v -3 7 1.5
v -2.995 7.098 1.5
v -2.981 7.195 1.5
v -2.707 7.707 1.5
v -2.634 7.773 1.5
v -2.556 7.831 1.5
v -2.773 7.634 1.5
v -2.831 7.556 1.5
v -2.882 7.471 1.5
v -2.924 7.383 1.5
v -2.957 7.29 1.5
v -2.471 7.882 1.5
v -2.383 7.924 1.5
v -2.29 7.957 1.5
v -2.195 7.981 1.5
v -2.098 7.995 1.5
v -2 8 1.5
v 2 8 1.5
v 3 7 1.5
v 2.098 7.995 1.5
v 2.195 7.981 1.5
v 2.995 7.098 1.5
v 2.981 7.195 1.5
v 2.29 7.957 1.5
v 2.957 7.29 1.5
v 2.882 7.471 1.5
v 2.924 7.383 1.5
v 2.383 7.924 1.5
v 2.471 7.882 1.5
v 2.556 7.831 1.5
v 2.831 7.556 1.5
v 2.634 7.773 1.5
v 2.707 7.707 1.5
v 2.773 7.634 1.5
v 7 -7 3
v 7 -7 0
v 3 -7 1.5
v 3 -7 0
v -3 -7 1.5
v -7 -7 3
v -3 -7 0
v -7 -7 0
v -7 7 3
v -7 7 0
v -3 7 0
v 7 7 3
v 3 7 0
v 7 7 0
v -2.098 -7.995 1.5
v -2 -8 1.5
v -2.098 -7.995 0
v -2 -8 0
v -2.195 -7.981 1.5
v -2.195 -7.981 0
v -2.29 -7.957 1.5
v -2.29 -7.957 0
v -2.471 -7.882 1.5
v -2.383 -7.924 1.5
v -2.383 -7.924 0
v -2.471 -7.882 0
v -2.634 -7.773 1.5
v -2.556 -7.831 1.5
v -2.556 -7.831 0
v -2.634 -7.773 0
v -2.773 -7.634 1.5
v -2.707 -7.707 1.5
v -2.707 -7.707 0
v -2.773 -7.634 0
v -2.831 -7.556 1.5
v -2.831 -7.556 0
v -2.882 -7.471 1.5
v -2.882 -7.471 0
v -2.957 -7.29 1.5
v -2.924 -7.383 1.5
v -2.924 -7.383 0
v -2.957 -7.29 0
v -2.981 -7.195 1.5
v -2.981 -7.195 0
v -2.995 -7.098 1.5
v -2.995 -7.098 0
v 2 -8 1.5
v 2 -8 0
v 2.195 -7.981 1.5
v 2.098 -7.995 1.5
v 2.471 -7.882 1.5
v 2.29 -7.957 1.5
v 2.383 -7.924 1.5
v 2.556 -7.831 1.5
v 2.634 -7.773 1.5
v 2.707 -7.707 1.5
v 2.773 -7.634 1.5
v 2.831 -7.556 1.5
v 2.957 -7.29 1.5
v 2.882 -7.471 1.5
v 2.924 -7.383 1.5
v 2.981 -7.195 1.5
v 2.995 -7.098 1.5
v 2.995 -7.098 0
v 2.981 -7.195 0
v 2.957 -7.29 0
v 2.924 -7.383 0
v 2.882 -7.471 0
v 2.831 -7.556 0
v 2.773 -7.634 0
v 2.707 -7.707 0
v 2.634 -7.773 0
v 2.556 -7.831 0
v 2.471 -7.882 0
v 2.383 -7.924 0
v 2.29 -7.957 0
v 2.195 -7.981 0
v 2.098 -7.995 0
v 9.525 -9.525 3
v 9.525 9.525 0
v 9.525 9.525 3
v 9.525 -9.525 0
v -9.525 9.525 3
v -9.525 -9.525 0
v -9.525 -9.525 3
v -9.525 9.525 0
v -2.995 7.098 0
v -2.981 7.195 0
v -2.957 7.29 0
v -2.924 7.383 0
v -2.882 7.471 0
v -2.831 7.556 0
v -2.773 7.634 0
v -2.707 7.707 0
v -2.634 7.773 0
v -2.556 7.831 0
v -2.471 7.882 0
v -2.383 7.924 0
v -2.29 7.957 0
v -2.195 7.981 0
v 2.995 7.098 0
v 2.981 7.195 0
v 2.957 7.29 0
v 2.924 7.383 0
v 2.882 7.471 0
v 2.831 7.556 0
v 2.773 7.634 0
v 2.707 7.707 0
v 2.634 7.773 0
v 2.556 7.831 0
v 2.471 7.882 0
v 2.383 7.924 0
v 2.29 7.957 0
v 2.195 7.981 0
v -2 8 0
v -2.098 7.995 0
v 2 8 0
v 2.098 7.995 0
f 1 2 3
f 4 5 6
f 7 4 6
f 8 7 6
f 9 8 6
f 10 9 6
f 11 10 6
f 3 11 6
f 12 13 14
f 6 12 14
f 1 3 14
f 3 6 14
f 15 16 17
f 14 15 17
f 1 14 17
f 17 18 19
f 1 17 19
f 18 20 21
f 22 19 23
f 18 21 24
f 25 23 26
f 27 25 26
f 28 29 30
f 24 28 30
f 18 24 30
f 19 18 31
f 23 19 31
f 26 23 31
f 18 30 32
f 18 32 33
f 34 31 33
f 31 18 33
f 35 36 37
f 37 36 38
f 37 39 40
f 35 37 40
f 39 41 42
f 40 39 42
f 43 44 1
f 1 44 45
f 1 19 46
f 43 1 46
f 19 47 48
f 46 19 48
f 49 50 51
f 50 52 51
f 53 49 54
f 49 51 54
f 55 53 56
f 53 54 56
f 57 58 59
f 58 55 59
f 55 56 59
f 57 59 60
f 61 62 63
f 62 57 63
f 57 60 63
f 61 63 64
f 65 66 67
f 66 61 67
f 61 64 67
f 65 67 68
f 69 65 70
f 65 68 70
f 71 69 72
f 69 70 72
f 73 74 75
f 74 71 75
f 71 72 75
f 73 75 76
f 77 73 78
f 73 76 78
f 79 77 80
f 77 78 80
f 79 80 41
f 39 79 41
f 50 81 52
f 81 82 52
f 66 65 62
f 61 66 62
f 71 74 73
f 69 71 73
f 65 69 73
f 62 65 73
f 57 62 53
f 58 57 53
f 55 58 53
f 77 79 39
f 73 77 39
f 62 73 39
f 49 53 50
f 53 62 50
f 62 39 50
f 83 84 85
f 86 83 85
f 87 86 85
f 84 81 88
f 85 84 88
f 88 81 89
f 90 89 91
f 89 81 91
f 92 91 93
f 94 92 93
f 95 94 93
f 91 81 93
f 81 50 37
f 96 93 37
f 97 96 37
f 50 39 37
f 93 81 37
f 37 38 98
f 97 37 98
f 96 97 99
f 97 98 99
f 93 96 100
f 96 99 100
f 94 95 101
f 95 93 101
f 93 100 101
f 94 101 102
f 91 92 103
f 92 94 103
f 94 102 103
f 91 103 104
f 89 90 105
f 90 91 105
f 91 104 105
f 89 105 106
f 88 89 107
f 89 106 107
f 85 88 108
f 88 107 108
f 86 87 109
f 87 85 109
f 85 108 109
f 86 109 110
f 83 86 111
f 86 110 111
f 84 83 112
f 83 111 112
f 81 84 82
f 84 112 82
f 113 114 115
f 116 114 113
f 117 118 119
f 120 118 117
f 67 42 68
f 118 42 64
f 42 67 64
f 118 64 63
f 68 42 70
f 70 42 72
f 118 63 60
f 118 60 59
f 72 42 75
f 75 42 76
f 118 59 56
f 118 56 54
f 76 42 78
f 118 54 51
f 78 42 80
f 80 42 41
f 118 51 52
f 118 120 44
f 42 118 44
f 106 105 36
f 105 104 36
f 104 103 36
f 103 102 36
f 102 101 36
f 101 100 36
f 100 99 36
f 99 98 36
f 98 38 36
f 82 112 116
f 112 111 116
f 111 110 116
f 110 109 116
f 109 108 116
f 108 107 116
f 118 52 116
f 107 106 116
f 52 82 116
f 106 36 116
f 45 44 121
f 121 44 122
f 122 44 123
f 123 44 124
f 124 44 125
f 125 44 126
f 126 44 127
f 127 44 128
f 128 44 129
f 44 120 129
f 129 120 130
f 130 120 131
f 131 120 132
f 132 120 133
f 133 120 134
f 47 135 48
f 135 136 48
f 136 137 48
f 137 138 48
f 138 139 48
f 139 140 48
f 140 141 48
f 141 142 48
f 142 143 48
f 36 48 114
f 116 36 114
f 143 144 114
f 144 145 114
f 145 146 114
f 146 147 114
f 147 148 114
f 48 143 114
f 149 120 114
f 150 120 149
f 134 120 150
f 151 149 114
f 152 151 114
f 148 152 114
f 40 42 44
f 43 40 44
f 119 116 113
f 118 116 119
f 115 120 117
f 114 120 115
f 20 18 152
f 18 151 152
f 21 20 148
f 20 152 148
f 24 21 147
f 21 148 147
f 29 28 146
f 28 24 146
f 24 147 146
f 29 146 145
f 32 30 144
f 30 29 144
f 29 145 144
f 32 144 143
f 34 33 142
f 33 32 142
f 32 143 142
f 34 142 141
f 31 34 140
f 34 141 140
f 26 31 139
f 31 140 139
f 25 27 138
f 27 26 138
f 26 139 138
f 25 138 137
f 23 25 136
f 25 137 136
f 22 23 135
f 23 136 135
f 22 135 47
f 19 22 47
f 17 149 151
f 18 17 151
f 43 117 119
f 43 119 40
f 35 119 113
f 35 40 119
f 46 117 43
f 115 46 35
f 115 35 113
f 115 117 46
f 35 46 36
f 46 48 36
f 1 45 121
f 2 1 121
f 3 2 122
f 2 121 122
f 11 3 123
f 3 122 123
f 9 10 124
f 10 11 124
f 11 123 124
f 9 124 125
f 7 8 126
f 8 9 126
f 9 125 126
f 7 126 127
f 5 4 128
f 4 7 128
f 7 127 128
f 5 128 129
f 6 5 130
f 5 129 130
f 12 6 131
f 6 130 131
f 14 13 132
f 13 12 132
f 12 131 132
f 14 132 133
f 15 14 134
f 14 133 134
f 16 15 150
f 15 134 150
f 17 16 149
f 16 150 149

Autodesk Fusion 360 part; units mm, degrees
sketch "スケッチ1" plane through (0, 0, 0) normal (0, 0, 1) x (1, 0, 0)
  line L0 (7, -7) -> (-7, -7)
  line L1 (-7, -7) -> (-7, 7)
  line L2 (-7, 7) -> (7, 7)
  line L3 (7, 7) -> (7, -7)
  line L4 (9.525, -9.525) -> (-9.525, -9.525)
  line L5 (-9.525, -9.525) -> (-9.525, 9.525)
  line L6 (-9.525, 9.525) -> (9.525, 9.525)
  line L7 (9.525, 9.525) -> (9.525, -9.525)
  line L8 (3, 7) -> (3, 7)
  line L9 (-3, 7) -> (-3, 7)
  line L10 (-2, 8) -> (2, 8)
  line L11 (3, -7) -> (3, -7)
  line L12 (2, -8) -> (-2, -8)
  line L13 (-3, -7) -> (-3, -7)
  arc A0 (2, -8) -> (3, -7) centre (2, -7) ccw
  arc A1 (-3, -7) -> (-2, -8) centre (-2, -7) ccw
  arc A2 (3, 7) -> (2, 8) centre (2, 7) ccw
  arc A3 (-2, 8) -> (-3, 7) centre (-2, 7) ccw
  dimension "d8" = 1
extrude "押し出し1" add sketch "スケッチ1" along normal blind 3
extrude "押し出し2" add sketch "スケッチ1" along normal blind 1.5 from surface at 1.5 contours L0 L12 A0 A1 | L2 L10 A2 A3
